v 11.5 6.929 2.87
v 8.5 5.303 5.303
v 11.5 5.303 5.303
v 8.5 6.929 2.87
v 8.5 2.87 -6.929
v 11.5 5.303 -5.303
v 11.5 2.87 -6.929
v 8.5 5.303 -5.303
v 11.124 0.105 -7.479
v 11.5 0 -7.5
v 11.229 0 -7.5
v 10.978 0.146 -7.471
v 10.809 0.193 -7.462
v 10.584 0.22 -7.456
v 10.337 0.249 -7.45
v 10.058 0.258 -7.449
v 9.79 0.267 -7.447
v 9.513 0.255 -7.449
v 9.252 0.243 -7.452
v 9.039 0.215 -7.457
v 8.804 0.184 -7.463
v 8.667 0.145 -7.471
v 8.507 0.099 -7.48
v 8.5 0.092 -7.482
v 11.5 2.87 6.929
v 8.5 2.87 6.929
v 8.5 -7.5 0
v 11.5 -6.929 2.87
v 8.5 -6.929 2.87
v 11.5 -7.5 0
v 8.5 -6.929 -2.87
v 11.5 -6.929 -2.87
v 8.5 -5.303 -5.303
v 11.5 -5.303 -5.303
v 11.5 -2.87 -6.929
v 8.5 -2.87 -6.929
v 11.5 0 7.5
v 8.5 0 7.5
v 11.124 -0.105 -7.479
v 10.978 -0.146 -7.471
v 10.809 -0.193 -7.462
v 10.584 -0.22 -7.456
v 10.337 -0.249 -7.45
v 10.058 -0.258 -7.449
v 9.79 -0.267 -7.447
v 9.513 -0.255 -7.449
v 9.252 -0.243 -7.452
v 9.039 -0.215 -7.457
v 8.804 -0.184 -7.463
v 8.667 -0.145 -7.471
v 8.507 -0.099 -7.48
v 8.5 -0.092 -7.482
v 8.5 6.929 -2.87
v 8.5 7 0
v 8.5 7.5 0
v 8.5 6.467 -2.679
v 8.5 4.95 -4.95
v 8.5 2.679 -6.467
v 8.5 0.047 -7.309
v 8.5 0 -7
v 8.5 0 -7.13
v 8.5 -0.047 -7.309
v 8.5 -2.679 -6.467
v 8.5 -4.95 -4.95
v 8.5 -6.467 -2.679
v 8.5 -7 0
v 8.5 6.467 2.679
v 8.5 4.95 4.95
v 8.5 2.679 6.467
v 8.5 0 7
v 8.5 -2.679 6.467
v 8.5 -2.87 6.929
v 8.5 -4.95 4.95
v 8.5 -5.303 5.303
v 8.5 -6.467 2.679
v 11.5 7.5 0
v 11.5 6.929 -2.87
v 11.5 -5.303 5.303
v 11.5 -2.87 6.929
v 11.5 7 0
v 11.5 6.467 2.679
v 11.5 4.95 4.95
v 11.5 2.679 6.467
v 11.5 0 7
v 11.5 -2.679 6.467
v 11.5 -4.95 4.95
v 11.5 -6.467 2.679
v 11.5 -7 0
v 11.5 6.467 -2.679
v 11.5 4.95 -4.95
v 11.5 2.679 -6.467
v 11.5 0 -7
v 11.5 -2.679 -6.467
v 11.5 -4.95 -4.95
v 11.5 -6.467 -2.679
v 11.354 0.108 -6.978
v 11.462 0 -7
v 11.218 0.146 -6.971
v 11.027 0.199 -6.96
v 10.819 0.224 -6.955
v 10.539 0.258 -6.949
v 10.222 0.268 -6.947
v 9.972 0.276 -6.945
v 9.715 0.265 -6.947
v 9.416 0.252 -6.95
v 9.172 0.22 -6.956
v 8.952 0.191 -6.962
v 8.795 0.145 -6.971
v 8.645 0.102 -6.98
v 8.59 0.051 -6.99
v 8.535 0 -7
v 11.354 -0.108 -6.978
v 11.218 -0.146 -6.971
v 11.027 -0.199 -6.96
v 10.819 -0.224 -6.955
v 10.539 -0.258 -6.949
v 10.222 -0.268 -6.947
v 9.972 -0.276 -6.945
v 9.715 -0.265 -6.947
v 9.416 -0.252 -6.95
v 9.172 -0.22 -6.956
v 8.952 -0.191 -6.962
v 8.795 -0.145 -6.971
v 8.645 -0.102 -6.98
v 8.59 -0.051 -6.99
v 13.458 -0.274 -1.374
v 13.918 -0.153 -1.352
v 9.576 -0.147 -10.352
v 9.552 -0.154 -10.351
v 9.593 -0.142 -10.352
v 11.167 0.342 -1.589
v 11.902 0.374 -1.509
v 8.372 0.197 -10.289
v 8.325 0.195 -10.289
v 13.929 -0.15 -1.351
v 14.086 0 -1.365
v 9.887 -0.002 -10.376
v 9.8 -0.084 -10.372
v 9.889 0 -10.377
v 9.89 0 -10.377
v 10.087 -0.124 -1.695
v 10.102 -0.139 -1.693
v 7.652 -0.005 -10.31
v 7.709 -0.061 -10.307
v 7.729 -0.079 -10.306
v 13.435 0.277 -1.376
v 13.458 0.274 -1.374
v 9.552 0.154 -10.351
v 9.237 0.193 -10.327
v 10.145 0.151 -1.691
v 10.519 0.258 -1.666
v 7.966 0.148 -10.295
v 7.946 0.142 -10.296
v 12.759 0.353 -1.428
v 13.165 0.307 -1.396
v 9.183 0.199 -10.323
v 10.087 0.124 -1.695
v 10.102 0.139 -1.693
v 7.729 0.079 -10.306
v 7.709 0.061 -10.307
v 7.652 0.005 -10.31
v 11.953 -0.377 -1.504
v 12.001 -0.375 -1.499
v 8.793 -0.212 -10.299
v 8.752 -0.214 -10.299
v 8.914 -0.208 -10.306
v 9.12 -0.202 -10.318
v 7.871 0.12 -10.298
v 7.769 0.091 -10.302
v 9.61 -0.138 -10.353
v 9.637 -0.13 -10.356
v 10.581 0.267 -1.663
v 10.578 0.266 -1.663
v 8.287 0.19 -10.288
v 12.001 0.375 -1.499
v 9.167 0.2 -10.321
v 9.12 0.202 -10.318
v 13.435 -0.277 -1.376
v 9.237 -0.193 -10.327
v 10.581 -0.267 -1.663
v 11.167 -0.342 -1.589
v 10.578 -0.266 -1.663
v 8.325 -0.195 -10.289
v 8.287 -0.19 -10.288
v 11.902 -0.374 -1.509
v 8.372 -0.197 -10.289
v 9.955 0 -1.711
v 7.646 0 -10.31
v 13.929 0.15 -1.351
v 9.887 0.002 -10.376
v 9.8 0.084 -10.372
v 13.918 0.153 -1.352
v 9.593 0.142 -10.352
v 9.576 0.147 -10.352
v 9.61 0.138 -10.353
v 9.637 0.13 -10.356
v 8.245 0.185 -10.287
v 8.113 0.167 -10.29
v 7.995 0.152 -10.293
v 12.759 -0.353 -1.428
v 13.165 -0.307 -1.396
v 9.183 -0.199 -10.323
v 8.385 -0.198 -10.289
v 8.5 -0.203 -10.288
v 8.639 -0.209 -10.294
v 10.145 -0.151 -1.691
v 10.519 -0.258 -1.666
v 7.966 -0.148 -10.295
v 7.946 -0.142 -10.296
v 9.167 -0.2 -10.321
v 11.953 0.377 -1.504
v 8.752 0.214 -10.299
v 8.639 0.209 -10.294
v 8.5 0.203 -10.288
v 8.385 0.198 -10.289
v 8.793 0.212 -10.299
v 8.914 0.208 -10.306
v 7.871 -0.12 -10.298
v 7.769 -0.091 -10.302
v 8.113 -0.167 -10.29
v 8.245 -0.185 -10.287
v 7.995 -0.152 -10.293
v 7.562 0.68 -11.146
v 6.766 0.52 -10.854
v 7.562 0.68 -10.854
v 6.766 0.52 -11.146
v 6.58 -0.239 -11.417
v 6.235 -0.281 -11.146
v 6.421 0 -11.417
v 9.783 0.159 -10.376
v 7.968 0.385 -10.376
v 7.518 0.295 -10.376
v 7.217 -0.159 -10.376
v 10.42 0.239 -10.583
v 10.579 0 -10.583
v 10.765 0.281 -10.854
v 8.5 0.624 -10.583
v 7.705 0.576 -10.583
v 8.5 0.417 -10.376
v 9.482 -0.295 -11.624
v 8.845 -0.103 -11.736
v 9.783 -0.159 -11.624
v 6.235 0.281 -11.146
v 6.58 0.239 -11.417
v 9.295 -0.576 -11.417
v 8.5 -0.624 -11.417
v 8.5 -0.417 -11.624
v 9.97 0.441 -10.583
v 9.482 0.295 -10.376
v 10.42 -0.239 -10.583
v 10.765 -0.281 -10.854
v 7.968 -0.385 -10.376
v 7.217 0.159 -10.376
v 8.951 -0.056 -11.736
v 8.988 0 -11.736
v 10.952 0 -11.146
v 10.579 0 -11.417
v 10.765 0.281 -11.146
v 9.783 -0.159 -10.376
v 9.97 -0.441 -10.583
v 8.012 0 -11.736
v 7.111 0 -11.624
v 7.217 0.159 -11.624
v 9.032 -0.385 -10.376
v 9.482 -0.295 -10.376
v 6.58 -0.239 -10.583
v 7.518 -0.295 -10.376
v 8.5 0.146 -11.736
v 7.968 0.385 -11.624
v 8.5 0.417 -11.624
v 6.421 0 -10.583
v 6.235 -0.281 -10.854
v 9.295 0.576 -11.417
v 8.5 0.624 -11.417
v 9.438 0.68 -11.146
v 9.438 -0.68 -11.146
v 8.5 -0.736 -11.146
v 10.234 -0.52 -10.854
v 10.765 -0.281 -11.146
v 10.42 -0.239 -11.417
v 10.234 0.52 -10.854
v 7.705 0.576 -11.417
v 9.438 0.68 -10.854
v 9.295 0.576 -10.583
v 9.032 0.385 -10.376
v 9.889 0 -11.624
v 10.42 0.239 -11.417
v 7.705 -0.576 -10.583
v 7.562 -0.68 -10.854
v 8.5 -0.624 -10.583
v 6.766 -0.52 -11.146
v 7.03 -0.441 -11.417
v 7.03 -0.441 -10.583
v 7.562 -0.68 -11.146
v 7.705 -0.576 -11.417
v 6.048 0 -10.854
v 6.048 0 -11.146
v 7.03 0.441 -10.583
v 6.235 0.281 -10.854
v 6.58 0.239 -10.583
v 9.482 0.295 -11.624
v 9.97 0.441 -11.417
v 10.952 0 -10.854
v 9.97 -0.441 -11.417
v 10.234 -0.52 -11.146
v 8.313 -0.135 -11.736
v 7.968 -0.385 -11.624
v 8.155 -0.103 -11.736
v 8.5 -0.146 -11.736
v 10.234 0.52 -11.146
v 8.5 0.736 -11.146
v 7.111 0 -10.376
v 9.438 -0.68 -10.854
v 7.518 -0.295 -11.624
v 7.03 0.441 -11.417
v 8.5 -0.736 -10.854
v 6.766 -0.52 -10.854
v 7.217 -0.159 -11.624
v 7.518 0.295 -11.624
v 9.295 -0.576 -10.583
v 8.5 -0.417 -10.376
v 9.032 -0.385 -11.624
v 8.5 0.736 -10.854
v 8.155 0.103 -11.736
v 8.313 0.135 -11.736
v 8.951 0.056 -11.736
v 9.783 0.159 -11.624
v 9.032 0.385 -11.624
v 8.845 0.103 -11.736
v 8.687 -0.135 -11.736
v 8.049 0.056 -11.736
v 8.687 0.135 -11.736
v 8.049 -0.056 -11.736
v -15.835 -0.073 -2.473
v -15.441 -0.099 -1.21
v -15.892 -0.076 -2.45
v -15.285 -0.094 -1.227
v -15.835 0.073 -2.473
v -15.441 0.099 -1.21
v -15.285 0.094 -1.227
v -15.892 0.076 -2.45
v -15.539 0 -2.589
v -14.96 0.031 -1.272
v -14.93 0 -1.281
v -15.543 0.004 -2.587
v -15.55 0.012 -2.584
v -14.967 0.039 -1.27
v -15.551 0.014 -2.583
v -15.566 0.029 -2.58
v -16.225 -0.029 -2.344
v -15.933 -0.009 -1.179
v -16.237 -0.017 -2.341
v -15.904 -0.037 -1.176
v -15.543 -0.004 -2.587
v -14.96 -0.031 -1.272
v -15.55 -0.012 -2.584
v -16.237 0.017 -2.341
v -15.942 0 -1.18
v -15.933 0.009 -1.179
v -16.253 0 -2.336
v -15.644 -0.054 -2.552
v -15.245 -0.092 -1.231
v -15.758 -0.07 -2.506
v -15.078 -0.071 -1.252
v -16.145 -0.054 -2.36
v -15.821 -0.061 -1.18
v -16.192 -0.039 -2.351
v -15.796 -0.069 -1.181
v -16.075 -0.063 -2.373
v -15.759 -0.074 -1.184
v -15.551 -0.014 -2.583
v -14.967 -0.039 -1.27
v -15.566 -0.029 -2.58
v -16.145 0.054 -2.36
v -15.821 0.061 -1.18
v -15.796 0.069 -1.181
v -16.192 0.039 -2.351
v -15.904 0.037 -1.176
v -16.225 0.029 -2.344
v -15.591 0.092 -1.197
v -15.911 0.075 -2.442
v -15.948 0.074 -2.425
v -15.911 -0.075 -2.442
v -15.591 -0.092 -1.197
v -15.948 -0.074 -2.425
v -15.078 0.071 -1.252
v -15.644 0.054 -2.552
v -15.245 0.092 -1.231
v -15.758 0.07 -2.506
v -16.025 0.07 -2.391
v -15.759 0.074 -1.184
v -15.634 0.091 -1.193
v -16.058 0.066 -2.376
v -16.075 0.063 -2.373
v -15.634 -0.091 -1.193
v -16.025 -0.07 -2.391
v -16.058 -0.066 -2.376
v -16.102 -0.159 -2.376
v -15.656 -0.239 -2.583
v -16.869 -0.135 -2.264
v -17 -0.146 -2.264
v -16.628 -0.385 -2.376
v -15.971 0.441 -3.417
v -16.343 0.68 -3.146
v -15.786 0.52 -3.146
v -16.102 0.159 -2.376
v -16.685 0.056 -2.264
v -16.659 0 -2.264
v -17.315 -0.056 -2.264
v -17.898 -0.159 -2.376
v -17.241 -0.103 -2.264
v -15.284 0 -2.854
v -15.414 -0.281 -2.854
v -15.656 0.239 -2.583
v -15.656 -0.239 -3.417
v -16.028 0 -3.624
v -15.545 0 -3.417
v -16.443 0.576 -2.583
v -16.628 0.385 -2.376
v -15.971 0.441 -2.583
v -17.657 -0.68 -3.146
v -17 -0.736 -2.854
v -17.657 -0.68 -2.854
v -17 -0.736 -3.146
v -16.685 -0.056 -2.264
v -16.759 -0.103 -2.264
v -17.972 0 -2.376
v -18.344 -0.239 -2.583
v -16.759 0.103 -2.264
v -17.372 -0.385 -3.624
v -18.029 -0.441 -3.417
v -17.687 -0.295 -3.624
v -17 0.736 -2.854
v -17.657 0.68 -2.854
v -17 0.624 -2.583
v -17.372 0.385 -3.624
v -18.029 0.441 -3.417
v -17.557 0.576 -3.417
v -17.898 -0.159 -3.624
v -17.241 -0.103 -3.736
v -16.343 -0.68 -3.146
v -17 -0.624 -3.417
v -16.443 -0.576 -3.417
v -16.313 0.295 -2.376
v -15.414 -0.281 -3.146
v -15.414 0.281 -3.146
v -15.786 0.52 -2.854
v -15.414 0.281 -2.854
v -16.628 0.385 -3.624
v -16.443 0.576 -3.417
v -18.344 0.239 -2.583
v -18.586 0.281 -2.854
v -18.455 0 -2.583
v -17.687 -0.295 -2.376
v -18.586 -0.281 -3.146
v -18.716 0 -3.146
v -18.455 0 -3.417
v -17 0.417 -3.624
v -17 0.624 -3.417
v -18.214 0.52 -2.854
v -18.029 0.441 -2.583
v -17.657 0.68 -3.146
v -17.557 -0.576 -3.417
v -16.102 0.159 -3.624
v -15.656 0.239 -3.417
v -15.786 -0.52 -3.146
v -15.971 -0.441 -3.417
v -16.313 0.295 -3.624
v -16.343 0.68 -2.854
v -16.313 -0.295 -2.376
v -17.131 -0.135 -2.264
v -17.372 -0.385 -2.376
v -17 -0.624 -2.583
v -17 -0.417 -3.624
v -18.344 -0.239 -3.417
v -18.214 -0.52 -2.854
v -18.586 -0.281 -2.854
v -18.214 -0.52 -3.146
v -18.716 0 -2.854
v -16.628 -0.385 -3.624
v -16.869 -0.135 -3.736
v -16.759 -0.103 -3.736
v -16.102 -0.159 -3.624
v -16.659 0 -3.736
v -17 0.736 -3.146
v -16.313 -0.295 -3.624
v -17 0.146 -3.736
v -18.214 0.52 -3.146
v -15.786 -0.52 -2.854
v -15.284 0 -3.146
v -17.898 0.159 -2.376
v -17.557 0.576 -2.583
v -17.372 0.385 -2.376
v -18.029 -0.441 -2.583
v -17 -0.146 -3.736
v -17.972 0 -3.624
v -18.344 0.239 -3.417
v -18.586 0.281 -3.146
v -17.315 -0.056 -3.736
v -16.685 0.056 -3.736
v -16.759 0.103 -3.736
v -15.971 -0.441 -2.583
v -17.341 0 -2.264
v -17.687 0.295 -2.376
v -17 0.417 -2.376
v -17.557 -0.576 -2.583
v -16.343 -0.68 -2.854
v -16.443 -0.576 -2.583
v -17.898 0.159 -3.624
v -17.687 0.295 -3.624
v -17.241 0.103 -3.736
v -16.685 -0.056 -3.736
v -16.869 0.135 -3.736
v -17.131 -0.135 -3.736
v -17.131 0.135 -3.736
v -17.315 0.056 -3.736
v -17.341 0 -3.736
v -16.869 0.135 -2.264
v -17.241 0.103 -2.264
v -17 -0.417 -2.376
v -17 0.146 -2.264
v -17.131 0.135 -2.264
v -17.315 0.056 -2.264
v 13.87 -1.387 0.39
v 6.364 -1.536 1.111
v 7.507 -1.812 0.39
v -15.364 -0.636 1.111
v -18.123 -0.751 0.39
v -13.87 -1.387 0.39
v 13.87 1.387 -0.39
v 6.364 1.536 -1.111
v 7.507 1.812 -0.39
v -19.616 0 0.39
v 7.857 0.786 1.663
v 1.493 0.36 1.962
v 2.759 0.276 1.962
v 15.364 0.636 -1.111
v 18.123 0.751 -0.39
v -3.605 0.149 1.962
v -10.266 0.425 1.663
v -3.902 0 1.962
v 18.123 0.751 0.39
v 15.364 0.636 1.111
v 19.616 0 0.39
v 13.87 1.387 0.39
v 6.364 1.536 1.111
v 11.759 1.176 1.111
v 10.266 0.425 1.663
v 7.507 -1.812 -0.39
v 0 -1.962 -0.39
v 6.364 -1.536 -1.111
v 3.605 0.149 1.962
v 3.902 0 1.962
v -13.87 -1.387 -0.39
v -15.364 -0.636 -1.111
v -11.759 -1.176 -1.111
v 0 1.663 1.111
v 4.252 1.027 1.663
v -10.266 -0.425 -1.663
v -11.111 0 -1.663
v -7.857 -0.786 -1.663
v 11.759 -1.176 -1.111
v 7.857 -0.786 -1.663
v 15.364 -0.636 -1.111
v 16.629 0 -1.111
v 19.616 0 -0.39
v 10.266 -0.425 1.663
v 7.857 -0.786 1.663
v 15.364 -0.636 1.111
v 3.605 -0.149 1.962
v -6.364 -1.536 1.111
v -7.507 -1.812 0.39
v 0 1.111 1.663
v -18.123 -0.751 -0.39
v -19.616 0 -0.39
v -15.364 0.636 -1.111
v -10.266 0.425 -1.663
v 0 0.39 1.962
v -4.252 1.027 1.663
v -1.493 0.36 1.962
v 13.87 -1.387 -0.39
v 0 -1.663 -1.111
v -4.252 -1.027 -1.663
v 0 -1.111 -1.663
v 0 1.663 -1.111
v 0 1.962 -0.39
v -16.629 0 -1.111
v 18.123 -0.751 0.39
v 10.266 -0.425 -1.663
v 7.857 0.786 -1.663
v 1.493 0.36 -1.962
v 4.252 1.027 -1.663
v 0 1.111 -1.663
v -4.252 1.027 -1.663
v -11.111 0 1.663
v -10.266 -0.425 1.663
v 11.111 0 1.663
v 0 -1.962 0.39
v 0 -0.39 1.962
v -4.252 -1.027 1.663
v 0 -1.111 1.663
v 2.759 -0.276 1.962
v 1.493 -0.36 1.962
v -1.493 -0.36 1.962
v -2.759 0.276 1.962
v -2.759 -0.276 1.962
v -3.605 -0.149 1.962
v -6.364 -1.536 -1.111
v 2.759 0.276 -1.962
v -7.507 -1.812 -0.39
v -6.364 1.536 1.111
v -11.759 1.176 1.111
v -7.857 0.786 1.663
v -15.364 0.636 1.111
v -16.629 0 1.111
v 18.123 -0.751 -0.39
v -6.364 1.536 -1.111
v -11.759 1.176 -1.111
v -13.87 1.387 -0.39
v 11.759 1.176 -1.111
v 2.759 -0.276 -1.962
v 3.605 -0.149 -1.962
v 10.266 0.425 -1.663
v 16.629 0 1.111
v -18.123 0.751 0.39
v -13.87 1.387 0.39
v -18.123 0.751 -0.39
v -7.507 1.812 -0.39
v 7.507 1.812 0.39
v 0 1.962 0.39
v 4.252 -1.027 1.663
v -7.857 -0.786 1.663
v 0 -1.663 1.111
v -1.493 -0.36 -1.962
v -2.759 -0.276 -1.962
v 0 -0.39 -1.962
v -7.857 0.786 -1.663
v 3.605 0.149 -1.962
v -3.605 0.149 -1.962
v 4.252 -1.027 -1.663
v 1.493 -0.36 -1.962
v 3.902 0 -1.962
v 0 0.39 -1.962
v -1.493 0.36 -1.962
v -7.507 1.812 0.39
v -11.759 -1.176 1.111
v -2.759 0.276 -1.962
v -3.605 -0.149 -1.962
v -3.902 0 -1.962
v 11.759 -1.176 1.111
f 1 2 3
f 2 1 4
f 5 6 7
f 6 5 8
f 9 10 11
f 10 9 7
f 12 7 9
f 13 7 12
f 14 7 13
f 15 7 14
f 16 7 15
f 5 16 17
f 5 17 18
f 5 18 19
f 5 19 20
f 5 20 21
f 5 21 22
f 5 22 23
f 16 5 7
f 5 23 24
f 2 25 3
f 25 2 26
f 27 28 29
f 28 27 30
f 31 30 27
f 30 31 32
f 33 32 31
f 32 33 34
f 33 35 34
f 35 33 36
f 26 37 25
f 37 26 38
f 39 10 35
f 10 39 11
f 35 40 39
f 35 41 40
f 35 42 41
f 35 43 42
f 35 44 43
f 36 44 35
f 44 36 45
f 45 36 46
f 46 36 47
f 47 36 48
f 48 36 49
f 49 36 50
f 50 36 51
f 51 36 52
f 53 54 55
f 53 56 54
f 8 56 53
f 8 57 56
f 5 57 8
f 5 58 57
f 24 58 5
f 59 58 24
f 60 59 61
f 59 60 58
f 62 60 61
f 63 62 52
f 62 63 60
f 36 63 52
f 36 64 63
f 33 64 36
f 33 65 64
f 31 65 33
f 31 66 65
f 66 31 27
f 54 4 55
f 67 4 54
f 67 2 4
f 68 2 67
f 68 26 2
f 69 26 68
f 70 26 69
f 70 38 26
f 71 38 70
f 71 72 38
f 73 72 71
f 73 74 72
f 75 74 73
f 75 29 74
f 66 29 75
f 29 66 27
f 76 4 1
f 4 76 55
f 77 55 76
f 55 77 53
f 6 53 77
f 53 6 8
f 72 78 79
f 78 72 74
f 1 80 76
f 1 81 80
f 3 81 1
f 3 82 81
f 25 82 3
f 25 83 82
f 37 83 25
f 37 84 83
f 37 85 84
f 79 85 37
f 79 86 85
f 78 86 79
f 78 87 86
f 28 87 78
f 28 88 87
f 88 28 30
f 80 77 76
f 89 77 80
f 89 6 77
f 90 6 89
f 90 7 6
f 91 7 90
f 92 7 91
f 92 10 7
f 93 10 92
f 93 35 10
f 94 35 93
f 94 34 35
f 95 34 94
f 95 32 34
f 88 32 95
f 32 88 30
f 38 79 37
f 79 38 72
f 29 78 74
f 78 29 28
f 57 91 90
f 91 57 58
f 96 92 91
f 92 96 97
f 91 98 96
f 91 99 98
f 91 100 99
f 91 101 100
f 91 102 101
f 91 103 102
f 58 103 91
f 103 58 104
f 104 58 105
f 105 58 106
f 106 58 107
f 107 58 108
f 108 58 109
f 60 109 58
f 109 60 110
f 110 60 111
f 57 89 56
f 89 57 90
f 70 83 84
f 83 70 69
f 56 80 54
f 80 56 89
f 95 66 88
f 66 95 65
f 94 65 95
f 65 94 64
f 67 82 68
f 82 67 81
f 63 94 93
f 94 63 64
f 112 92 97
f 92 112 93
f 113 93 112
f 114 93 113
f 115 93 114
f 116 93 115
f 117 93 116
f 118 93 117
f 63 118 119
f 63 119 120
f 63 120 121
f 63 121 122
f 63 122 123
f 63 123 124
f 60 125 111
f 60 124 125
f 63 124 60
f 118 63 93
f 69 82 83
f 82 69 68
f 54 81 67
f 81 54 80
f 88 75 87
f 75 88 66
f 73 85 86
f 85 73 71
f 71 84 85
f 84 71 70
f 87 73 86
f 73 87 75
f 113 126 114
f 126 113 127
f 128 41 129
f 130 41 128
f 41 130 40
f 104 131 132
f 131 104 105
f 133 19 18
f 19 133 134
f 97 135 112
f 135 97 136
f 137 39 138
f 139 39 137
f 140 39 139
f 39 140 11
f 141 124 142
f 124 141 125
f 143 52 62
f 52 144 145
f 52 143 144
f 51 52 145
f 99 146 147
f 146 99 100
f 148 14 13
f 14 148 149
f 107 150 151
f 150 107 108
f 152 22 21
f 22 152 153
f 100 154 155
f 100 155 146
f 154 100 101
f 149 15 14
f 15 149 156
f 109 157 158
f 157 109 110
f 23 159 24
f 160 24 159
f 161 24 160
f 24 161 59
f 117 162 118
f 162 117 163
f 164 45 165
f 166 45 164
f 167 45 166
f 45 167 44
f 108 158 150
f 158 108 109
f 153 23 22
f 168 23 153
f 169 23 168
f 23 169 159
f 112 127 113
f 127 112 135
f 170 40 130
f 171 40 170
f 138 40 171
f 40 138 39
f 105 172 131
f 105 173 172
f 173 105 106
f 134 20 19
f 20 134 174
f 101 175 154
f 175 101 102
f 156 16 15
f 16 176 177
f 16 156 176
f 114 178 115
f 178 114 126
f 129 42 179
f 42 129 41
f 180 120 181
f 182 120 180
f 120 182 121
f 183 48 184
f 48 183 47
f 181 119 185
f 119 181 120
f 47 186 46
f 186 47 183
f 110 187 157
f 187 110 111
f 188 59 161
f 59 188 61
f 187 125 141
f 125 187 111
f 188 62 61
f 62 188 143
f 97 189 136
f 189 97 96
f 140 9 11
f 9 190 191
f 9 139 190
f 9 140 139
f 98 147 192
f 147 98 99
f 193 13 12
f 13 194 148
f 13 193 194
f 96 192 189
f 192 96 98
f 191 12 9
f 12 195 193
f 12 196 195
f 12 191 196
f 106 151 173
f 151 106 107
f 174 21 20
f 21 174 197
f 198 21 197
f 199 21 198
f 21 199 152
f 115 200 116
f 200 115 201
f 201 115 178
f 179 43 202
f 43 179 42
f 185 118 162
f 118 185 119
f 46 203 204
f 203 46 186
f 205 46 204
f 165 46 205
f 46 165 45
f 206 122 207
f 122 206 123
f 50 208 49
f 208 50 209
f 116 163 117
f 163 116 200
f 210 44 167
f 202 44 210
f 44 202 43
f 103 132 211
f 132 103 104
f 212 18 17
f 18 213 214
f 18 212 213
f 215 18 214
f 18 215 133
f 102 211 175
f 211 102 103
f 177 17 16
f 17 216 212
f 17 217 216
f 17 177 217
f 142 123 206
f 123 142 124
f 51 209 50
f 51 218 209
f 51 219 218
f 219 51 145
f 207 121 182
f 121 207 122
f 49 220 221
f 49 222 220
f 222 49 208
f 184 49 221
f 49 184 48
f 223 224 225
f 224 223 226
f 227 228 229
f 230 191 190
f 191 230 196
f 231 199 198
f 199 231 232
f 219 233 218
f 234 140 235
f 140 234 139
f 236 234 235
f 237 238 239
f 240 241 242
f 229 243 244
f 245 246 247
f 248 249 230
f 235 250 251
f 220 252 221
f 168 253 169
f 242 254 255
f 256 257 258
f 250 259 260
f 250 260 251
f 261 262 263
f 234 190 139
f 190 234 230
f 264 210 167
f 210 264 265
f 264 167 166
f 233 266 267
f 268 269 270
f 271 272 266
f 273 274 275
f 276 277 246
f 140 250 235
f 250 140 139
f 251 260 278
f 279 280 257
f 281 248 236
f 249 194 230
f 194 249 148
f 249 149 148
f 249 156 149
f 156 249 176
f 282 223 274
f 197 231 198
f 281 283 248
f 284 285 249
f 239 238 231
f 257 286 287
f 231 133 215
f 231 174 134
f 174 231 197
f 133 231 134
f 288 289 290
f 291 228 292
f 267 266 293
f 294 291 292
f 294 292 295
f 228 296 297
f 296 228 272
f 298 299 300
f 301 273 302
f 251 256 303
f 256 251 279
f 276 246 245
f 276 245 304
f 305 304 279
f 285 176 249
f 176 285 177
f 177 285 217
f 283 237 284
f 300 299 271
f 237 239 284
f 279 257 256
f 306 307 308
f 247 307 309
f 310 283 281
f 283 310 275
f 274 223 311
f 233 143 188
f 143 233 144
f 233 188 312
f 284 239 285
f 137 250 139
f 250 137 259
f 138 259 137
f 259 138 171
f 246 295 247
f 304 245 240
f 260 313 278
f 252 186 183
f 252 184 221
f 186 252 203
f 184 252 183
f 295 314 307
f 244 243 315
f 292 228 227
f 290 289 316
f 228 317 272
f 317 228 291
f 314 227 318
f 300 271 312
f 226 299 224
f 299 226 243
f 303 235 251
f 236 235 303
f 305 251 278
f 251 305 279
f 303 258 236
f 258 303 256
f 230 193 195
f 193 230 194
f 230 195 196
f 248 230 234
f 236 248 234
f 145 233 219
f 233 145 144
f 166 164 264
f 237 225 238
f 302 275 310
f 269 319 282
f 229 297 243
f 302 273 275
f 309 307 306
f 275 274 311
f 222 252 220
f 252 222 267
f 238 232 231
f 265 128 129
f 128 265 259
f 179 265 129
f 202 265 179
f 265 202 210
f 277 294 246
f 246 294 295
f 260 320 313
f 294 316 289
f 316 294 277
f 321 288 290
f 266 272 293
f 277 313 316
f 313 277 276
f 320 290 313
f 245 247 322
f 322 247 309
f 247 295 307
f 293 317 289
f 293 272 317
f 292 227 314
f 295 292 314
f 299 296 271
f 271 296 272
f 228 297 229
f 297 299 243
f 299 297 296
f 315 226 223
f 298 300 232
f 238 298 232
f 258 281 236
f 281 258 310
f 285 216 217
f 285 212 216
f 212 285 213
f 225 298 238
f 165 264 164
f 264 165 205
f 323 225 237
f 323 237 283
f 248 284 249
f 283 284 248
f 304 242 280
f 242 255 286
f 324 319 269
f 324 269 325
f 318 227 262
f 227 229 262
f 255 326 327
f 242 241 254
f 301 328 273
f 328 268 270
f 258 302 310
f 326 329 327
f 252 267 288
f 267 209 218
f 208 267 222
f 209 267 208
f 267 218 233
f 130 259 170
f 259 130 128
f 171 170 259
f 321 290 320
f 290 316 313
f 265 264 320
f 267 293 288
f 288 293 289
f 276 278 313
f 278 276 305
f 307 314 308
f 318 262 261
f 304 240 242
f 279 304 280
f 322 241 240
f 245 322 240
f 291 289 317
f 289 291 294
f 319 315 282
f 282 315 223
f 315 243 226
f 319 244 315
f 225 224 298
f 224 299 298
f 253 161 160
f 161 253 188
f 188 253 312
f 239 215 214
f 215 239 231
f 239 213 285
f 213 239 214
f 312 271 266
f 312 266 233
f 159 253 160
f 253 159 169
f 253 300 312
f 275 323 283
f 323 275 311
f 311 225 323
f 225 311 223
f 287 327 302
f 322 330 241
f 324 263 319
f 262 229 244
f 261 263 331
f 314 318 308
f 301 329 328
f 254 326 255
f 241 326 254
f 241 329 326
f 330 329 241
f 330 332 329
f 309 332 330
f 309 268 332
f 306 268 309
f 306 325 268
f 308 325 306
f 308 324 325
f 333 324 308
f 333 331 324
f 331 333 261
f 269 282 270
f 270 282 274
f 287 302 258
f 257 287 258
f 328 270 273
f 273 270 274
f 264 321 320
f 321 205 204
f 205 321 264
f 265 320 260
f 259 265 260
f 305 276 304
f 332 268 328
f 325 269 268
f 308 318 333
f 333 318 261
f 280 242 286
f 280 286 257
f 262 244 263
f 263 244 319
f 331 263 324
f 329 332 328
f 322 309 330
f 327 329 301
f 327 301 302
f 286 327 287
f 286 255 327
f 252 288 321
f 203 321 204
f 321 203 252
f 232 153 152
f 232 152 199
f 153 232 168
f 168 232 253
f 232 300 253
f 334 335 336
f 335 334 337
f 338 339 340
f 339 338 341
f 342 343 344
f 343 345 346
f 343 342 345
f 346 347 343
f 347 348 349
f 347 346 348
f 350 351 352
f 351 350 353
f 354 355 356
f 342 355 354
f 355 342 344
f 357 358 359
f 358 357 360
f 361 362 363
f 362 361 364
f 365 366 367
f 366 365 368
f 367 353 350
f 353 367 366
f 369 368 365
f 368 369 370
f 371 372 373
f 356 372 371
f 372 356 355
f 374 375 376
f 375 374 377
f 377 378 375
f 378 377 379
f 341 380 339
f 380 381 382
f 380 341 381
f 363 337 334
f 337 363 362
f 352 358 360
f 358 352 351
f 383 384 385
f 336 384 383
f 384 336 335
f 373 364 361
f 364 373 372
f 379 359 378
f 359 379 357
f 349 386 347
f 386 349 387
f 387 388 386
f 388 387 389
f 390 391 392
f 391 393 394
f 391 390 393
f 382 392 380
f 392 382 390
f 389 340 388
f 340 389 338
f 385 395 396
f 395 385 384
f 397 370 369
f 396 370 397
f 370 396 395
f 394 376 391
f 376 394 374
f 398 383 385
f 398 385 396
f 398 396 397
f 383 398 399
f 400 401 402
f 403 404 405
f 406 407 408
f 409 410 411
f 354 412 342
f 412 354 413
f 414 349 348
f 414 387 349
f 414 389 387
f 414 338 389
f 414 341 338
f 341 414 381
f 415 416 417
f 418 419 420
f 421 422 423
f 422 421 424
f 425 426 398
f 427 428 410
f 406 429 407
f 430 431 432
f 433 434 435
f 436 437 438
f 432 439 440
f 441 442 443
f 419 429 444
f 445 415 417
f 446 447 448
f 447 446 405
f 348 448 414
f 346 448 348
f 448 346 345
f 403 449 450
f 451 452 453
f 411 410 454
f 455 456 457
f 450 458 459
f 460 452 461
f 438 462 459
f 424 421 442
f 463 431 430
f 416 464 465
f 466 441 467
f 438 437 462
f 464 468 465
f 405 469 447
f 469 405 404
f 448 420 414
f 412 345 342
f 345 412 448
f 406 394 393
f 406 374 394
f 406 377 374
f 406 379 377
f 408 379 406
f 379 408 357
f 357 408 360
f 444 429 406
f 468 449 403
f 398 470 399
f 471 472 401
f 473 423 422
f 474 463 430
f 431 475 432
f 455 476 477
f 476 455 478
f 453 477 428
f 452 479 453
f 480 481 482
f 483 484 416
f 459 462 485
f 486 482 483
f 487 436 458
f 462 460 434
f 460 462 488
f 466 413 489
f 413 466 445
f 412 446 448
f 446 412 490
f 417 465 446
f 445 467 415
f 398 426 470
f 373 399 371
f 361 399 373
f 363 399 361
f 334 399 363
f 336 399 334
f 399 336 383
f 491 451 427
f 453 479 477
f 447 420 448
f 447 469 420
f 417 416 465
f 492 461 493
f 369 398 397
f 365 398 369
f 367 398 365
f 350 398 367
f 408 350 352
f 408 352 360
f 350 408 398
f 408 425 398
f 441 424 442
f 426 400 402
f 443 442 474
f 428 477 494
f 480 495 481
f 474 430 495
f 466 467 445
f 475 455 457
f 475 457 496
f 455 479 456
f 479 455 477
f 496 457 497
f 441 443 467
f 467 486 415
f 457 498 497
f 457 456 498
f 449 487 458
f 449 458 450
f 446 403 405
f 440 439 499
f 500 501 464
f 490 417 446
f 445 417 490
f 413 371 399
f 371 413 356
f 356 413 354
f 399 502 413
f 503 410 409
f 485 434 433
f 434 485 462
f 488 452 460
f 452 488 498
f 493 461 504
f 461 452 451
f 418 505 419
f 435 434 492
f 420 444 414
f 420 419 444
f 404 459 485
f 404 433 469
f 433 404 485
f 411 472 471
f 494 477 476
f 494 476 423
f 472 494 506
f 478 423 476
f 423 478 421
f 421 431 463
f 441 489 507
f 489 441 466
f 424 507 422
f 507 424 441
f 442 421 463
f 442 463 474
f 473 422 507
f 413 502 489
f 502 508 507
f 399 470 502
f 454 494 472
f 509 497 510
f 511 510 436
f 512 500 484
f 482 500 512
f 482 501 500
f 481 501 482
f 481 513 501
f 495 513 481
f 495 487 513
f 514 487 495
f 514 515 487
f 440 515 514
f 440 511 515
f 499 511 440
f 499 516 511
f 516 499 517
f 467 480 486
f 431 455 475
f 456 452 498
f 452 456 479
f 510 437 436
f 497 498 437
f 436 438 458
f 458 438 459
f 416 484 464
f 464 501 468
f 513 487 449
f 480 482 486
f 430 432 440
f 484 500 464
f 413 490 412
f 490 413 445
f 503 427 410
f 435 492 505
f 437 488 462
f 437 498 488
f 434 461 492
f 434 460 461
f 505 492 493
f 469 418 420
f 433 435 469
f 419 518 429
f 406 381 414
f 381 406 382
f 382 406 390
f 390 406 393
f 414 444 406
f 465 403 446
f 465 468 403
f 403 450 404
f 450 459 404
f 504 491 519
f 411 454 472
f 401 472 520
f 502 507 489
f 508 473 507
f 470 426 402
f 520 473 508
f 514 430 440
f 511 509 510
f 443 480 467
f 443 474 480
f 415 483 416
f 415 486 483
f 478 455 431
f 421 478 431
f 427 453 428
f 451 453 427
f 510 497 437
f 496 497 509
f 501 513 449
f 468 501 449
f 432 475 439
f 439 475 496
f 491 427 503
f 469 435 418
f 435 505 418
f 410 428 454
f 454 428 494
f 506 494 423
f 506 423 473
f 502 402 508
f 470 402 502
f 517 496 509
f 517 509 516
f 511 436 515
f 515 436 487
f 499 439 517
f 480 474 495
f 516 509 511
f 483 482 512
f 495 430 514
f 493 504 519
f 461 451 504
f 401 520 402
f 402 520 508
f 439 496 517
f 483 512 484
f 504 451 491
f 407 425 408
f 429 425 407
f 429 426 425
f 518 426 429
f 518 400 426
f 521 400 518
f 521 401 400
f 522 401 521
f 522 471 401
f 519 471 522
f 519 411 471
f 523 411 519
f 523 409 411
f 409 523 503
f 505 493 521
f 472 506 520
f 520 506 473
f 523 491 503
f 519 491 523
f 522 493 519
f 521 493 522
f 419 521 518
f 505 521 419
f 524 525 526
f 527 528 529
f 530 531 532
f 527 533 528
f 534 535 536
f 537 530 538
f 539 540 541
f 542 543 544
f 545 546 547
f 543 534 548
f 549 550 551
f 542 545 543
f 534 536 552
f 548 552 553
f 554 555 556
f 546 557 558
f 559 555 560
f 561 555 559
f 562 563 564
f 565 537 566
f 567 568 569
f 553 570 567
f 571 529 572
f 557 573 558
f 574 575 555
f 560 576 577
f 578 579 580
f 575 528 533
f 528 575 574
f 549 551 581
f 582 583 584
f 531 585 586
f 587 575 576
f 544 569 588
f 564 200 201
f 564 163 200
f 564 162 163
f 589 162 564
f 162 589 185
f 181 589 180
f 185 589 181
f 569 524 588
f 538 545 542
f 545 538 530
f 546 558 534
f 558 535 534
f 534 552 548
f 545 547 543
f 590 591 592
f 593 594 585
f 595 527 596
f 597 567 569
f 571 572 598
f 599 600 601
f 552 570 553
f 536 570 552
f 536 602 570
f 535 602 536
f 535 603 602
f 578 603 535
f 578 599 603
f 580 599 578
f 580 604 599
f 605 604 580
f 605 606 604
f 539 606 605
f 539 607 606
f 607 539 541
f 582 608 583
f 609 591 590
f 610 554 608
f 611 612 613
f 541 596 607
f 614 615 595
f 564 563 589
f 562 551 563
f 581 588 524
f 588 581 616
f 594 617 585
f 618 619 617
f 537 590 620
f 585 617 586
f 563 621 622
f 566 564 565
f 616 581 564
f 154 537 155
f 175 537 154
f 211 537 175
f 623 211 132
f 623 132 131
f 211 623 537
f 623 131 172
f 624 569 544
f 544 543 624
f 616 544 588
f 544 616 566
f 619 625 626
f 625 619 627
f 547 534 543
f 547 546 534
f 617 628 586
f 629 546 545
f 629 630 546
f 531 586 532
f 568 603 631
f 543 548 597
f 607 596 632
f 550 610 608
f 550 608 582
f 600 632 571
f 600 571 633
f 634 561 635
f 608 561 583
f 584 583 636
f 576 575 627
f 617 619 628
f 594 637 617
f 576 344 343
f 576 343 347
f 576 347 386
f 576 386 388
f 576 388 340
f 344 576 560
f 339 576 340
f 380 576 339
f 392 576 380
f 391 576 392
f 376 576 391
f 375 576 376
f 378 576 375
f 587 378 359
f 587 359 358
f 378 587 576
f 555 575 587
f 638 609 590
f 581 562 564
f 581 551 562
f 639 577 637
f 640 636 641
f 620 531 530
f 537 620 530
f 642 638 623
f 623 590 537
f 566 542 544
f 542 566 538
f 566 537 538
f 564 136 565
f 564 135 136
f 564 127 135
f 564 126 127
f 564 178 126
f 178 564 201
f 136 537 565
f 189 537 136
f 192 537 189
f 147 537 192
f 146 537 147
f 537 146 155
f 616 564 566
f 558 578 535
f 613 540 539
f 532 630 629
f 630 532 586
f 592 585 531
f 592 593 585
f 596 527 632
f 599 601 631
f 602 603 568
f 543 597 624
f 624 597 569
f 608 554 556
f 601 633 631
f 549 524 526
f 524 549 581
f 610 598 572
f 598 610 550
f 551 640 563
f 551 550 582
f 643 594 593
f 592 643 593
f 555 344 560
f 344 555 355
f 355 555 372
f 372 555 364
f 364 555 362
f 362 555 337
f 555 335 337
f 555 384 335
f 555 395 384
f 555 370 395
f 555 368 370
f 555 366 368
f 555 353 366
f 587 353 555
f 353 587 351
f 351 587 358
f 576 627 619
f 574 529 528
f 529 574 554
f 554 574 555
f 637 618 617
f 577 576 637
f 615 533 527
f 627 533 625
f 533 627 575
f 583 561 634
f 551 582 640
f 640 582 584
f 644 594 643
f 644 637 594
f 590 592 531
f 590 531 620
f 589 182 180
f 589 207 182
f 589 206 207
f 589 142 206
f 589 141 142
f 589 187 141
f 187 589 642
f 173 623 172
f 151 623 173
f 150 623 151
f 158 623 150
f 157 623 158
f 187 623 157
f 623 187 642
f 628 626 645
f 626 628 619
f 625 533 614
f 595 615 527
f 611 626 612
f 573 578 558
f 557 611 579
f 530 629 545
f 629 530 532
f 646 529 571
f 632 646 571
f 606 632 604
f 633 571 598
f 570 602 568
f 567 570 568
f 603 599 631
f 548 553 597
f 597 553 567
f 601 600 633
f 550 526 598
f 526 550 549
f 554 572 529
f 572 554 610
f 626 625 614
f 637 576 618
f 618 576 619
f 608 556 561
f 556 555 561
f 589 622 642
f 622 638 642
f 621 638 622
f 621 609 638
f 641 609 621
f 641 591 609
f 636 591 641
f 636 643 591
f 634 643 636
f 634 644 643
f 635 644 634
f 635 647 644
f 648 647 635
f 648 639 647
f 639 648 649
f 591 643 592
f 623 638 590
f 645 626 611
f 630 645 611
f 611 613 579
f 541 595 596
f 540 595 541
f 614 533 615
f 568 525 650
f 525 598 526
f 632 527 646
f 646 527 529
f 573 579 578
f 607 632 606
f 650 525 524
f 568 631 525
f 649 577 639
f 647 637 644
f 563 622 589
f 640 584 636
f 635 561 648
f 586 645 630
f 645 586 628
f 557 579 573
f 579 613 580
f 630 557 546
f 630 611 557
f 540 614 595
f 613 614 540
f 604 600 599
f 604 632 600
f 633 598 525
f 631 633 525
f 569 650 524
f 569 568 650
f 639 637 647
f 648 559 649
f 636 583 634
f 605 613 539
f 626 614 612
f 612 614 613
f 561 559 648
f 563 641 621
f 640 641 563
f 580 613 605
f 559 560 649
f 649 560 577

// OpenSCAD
$fn=16;

module tail()
{
	rotate(a = 90, v = [0, 1, 0])
	difference() {
		cylinder(h = 6, r1 = 15, r2 = 15, center = true);
		cylinder(h = 7, r1 = 14, r2 = 14, center = true);
	}
}

module tail_pillar()
{
	translate(v = [0, 0, -12])
	scale(v = [1, 0.2, 1])
	cylinder(h = 23, r1 = 2, r2 = 4, center = true);
}

module fuselage()
{
	scale(v = [1, 0.1, 0.1])
		sphere(r = 40);
}

module tail_assembly()
{
	translate(v = [20, 0, 0]) {
		tail();
		translate(v = [5, 0, 0])
		rotate(a = 20, v = [0, 1, 0])
			tail_pillar();
		translate(v = [-3, 0, -22])
		scale(v = [1, 0.3, 0.3])
			sphere(r = 5);
	}
}

module cockpit()
{
	translate(v = [-30, 0, 0]) {
		rotate(a = 20, v = [0, 1, 0])
			scale(v = [0.3, 0.3, 0.3])
				tail_pillar();
		translate(v = [-4, 0, -6])
			scale(v = [0.7, 0.3, 0.3])
				sphere(r = 5);
	}
}


module spacefarer()
{
	scale(v = [0.5, 0.5, 0.5]) {
		union() {
			tail_assembly();
			fuselage();
			cockpit();
		}
	}
}

spacefarer();
